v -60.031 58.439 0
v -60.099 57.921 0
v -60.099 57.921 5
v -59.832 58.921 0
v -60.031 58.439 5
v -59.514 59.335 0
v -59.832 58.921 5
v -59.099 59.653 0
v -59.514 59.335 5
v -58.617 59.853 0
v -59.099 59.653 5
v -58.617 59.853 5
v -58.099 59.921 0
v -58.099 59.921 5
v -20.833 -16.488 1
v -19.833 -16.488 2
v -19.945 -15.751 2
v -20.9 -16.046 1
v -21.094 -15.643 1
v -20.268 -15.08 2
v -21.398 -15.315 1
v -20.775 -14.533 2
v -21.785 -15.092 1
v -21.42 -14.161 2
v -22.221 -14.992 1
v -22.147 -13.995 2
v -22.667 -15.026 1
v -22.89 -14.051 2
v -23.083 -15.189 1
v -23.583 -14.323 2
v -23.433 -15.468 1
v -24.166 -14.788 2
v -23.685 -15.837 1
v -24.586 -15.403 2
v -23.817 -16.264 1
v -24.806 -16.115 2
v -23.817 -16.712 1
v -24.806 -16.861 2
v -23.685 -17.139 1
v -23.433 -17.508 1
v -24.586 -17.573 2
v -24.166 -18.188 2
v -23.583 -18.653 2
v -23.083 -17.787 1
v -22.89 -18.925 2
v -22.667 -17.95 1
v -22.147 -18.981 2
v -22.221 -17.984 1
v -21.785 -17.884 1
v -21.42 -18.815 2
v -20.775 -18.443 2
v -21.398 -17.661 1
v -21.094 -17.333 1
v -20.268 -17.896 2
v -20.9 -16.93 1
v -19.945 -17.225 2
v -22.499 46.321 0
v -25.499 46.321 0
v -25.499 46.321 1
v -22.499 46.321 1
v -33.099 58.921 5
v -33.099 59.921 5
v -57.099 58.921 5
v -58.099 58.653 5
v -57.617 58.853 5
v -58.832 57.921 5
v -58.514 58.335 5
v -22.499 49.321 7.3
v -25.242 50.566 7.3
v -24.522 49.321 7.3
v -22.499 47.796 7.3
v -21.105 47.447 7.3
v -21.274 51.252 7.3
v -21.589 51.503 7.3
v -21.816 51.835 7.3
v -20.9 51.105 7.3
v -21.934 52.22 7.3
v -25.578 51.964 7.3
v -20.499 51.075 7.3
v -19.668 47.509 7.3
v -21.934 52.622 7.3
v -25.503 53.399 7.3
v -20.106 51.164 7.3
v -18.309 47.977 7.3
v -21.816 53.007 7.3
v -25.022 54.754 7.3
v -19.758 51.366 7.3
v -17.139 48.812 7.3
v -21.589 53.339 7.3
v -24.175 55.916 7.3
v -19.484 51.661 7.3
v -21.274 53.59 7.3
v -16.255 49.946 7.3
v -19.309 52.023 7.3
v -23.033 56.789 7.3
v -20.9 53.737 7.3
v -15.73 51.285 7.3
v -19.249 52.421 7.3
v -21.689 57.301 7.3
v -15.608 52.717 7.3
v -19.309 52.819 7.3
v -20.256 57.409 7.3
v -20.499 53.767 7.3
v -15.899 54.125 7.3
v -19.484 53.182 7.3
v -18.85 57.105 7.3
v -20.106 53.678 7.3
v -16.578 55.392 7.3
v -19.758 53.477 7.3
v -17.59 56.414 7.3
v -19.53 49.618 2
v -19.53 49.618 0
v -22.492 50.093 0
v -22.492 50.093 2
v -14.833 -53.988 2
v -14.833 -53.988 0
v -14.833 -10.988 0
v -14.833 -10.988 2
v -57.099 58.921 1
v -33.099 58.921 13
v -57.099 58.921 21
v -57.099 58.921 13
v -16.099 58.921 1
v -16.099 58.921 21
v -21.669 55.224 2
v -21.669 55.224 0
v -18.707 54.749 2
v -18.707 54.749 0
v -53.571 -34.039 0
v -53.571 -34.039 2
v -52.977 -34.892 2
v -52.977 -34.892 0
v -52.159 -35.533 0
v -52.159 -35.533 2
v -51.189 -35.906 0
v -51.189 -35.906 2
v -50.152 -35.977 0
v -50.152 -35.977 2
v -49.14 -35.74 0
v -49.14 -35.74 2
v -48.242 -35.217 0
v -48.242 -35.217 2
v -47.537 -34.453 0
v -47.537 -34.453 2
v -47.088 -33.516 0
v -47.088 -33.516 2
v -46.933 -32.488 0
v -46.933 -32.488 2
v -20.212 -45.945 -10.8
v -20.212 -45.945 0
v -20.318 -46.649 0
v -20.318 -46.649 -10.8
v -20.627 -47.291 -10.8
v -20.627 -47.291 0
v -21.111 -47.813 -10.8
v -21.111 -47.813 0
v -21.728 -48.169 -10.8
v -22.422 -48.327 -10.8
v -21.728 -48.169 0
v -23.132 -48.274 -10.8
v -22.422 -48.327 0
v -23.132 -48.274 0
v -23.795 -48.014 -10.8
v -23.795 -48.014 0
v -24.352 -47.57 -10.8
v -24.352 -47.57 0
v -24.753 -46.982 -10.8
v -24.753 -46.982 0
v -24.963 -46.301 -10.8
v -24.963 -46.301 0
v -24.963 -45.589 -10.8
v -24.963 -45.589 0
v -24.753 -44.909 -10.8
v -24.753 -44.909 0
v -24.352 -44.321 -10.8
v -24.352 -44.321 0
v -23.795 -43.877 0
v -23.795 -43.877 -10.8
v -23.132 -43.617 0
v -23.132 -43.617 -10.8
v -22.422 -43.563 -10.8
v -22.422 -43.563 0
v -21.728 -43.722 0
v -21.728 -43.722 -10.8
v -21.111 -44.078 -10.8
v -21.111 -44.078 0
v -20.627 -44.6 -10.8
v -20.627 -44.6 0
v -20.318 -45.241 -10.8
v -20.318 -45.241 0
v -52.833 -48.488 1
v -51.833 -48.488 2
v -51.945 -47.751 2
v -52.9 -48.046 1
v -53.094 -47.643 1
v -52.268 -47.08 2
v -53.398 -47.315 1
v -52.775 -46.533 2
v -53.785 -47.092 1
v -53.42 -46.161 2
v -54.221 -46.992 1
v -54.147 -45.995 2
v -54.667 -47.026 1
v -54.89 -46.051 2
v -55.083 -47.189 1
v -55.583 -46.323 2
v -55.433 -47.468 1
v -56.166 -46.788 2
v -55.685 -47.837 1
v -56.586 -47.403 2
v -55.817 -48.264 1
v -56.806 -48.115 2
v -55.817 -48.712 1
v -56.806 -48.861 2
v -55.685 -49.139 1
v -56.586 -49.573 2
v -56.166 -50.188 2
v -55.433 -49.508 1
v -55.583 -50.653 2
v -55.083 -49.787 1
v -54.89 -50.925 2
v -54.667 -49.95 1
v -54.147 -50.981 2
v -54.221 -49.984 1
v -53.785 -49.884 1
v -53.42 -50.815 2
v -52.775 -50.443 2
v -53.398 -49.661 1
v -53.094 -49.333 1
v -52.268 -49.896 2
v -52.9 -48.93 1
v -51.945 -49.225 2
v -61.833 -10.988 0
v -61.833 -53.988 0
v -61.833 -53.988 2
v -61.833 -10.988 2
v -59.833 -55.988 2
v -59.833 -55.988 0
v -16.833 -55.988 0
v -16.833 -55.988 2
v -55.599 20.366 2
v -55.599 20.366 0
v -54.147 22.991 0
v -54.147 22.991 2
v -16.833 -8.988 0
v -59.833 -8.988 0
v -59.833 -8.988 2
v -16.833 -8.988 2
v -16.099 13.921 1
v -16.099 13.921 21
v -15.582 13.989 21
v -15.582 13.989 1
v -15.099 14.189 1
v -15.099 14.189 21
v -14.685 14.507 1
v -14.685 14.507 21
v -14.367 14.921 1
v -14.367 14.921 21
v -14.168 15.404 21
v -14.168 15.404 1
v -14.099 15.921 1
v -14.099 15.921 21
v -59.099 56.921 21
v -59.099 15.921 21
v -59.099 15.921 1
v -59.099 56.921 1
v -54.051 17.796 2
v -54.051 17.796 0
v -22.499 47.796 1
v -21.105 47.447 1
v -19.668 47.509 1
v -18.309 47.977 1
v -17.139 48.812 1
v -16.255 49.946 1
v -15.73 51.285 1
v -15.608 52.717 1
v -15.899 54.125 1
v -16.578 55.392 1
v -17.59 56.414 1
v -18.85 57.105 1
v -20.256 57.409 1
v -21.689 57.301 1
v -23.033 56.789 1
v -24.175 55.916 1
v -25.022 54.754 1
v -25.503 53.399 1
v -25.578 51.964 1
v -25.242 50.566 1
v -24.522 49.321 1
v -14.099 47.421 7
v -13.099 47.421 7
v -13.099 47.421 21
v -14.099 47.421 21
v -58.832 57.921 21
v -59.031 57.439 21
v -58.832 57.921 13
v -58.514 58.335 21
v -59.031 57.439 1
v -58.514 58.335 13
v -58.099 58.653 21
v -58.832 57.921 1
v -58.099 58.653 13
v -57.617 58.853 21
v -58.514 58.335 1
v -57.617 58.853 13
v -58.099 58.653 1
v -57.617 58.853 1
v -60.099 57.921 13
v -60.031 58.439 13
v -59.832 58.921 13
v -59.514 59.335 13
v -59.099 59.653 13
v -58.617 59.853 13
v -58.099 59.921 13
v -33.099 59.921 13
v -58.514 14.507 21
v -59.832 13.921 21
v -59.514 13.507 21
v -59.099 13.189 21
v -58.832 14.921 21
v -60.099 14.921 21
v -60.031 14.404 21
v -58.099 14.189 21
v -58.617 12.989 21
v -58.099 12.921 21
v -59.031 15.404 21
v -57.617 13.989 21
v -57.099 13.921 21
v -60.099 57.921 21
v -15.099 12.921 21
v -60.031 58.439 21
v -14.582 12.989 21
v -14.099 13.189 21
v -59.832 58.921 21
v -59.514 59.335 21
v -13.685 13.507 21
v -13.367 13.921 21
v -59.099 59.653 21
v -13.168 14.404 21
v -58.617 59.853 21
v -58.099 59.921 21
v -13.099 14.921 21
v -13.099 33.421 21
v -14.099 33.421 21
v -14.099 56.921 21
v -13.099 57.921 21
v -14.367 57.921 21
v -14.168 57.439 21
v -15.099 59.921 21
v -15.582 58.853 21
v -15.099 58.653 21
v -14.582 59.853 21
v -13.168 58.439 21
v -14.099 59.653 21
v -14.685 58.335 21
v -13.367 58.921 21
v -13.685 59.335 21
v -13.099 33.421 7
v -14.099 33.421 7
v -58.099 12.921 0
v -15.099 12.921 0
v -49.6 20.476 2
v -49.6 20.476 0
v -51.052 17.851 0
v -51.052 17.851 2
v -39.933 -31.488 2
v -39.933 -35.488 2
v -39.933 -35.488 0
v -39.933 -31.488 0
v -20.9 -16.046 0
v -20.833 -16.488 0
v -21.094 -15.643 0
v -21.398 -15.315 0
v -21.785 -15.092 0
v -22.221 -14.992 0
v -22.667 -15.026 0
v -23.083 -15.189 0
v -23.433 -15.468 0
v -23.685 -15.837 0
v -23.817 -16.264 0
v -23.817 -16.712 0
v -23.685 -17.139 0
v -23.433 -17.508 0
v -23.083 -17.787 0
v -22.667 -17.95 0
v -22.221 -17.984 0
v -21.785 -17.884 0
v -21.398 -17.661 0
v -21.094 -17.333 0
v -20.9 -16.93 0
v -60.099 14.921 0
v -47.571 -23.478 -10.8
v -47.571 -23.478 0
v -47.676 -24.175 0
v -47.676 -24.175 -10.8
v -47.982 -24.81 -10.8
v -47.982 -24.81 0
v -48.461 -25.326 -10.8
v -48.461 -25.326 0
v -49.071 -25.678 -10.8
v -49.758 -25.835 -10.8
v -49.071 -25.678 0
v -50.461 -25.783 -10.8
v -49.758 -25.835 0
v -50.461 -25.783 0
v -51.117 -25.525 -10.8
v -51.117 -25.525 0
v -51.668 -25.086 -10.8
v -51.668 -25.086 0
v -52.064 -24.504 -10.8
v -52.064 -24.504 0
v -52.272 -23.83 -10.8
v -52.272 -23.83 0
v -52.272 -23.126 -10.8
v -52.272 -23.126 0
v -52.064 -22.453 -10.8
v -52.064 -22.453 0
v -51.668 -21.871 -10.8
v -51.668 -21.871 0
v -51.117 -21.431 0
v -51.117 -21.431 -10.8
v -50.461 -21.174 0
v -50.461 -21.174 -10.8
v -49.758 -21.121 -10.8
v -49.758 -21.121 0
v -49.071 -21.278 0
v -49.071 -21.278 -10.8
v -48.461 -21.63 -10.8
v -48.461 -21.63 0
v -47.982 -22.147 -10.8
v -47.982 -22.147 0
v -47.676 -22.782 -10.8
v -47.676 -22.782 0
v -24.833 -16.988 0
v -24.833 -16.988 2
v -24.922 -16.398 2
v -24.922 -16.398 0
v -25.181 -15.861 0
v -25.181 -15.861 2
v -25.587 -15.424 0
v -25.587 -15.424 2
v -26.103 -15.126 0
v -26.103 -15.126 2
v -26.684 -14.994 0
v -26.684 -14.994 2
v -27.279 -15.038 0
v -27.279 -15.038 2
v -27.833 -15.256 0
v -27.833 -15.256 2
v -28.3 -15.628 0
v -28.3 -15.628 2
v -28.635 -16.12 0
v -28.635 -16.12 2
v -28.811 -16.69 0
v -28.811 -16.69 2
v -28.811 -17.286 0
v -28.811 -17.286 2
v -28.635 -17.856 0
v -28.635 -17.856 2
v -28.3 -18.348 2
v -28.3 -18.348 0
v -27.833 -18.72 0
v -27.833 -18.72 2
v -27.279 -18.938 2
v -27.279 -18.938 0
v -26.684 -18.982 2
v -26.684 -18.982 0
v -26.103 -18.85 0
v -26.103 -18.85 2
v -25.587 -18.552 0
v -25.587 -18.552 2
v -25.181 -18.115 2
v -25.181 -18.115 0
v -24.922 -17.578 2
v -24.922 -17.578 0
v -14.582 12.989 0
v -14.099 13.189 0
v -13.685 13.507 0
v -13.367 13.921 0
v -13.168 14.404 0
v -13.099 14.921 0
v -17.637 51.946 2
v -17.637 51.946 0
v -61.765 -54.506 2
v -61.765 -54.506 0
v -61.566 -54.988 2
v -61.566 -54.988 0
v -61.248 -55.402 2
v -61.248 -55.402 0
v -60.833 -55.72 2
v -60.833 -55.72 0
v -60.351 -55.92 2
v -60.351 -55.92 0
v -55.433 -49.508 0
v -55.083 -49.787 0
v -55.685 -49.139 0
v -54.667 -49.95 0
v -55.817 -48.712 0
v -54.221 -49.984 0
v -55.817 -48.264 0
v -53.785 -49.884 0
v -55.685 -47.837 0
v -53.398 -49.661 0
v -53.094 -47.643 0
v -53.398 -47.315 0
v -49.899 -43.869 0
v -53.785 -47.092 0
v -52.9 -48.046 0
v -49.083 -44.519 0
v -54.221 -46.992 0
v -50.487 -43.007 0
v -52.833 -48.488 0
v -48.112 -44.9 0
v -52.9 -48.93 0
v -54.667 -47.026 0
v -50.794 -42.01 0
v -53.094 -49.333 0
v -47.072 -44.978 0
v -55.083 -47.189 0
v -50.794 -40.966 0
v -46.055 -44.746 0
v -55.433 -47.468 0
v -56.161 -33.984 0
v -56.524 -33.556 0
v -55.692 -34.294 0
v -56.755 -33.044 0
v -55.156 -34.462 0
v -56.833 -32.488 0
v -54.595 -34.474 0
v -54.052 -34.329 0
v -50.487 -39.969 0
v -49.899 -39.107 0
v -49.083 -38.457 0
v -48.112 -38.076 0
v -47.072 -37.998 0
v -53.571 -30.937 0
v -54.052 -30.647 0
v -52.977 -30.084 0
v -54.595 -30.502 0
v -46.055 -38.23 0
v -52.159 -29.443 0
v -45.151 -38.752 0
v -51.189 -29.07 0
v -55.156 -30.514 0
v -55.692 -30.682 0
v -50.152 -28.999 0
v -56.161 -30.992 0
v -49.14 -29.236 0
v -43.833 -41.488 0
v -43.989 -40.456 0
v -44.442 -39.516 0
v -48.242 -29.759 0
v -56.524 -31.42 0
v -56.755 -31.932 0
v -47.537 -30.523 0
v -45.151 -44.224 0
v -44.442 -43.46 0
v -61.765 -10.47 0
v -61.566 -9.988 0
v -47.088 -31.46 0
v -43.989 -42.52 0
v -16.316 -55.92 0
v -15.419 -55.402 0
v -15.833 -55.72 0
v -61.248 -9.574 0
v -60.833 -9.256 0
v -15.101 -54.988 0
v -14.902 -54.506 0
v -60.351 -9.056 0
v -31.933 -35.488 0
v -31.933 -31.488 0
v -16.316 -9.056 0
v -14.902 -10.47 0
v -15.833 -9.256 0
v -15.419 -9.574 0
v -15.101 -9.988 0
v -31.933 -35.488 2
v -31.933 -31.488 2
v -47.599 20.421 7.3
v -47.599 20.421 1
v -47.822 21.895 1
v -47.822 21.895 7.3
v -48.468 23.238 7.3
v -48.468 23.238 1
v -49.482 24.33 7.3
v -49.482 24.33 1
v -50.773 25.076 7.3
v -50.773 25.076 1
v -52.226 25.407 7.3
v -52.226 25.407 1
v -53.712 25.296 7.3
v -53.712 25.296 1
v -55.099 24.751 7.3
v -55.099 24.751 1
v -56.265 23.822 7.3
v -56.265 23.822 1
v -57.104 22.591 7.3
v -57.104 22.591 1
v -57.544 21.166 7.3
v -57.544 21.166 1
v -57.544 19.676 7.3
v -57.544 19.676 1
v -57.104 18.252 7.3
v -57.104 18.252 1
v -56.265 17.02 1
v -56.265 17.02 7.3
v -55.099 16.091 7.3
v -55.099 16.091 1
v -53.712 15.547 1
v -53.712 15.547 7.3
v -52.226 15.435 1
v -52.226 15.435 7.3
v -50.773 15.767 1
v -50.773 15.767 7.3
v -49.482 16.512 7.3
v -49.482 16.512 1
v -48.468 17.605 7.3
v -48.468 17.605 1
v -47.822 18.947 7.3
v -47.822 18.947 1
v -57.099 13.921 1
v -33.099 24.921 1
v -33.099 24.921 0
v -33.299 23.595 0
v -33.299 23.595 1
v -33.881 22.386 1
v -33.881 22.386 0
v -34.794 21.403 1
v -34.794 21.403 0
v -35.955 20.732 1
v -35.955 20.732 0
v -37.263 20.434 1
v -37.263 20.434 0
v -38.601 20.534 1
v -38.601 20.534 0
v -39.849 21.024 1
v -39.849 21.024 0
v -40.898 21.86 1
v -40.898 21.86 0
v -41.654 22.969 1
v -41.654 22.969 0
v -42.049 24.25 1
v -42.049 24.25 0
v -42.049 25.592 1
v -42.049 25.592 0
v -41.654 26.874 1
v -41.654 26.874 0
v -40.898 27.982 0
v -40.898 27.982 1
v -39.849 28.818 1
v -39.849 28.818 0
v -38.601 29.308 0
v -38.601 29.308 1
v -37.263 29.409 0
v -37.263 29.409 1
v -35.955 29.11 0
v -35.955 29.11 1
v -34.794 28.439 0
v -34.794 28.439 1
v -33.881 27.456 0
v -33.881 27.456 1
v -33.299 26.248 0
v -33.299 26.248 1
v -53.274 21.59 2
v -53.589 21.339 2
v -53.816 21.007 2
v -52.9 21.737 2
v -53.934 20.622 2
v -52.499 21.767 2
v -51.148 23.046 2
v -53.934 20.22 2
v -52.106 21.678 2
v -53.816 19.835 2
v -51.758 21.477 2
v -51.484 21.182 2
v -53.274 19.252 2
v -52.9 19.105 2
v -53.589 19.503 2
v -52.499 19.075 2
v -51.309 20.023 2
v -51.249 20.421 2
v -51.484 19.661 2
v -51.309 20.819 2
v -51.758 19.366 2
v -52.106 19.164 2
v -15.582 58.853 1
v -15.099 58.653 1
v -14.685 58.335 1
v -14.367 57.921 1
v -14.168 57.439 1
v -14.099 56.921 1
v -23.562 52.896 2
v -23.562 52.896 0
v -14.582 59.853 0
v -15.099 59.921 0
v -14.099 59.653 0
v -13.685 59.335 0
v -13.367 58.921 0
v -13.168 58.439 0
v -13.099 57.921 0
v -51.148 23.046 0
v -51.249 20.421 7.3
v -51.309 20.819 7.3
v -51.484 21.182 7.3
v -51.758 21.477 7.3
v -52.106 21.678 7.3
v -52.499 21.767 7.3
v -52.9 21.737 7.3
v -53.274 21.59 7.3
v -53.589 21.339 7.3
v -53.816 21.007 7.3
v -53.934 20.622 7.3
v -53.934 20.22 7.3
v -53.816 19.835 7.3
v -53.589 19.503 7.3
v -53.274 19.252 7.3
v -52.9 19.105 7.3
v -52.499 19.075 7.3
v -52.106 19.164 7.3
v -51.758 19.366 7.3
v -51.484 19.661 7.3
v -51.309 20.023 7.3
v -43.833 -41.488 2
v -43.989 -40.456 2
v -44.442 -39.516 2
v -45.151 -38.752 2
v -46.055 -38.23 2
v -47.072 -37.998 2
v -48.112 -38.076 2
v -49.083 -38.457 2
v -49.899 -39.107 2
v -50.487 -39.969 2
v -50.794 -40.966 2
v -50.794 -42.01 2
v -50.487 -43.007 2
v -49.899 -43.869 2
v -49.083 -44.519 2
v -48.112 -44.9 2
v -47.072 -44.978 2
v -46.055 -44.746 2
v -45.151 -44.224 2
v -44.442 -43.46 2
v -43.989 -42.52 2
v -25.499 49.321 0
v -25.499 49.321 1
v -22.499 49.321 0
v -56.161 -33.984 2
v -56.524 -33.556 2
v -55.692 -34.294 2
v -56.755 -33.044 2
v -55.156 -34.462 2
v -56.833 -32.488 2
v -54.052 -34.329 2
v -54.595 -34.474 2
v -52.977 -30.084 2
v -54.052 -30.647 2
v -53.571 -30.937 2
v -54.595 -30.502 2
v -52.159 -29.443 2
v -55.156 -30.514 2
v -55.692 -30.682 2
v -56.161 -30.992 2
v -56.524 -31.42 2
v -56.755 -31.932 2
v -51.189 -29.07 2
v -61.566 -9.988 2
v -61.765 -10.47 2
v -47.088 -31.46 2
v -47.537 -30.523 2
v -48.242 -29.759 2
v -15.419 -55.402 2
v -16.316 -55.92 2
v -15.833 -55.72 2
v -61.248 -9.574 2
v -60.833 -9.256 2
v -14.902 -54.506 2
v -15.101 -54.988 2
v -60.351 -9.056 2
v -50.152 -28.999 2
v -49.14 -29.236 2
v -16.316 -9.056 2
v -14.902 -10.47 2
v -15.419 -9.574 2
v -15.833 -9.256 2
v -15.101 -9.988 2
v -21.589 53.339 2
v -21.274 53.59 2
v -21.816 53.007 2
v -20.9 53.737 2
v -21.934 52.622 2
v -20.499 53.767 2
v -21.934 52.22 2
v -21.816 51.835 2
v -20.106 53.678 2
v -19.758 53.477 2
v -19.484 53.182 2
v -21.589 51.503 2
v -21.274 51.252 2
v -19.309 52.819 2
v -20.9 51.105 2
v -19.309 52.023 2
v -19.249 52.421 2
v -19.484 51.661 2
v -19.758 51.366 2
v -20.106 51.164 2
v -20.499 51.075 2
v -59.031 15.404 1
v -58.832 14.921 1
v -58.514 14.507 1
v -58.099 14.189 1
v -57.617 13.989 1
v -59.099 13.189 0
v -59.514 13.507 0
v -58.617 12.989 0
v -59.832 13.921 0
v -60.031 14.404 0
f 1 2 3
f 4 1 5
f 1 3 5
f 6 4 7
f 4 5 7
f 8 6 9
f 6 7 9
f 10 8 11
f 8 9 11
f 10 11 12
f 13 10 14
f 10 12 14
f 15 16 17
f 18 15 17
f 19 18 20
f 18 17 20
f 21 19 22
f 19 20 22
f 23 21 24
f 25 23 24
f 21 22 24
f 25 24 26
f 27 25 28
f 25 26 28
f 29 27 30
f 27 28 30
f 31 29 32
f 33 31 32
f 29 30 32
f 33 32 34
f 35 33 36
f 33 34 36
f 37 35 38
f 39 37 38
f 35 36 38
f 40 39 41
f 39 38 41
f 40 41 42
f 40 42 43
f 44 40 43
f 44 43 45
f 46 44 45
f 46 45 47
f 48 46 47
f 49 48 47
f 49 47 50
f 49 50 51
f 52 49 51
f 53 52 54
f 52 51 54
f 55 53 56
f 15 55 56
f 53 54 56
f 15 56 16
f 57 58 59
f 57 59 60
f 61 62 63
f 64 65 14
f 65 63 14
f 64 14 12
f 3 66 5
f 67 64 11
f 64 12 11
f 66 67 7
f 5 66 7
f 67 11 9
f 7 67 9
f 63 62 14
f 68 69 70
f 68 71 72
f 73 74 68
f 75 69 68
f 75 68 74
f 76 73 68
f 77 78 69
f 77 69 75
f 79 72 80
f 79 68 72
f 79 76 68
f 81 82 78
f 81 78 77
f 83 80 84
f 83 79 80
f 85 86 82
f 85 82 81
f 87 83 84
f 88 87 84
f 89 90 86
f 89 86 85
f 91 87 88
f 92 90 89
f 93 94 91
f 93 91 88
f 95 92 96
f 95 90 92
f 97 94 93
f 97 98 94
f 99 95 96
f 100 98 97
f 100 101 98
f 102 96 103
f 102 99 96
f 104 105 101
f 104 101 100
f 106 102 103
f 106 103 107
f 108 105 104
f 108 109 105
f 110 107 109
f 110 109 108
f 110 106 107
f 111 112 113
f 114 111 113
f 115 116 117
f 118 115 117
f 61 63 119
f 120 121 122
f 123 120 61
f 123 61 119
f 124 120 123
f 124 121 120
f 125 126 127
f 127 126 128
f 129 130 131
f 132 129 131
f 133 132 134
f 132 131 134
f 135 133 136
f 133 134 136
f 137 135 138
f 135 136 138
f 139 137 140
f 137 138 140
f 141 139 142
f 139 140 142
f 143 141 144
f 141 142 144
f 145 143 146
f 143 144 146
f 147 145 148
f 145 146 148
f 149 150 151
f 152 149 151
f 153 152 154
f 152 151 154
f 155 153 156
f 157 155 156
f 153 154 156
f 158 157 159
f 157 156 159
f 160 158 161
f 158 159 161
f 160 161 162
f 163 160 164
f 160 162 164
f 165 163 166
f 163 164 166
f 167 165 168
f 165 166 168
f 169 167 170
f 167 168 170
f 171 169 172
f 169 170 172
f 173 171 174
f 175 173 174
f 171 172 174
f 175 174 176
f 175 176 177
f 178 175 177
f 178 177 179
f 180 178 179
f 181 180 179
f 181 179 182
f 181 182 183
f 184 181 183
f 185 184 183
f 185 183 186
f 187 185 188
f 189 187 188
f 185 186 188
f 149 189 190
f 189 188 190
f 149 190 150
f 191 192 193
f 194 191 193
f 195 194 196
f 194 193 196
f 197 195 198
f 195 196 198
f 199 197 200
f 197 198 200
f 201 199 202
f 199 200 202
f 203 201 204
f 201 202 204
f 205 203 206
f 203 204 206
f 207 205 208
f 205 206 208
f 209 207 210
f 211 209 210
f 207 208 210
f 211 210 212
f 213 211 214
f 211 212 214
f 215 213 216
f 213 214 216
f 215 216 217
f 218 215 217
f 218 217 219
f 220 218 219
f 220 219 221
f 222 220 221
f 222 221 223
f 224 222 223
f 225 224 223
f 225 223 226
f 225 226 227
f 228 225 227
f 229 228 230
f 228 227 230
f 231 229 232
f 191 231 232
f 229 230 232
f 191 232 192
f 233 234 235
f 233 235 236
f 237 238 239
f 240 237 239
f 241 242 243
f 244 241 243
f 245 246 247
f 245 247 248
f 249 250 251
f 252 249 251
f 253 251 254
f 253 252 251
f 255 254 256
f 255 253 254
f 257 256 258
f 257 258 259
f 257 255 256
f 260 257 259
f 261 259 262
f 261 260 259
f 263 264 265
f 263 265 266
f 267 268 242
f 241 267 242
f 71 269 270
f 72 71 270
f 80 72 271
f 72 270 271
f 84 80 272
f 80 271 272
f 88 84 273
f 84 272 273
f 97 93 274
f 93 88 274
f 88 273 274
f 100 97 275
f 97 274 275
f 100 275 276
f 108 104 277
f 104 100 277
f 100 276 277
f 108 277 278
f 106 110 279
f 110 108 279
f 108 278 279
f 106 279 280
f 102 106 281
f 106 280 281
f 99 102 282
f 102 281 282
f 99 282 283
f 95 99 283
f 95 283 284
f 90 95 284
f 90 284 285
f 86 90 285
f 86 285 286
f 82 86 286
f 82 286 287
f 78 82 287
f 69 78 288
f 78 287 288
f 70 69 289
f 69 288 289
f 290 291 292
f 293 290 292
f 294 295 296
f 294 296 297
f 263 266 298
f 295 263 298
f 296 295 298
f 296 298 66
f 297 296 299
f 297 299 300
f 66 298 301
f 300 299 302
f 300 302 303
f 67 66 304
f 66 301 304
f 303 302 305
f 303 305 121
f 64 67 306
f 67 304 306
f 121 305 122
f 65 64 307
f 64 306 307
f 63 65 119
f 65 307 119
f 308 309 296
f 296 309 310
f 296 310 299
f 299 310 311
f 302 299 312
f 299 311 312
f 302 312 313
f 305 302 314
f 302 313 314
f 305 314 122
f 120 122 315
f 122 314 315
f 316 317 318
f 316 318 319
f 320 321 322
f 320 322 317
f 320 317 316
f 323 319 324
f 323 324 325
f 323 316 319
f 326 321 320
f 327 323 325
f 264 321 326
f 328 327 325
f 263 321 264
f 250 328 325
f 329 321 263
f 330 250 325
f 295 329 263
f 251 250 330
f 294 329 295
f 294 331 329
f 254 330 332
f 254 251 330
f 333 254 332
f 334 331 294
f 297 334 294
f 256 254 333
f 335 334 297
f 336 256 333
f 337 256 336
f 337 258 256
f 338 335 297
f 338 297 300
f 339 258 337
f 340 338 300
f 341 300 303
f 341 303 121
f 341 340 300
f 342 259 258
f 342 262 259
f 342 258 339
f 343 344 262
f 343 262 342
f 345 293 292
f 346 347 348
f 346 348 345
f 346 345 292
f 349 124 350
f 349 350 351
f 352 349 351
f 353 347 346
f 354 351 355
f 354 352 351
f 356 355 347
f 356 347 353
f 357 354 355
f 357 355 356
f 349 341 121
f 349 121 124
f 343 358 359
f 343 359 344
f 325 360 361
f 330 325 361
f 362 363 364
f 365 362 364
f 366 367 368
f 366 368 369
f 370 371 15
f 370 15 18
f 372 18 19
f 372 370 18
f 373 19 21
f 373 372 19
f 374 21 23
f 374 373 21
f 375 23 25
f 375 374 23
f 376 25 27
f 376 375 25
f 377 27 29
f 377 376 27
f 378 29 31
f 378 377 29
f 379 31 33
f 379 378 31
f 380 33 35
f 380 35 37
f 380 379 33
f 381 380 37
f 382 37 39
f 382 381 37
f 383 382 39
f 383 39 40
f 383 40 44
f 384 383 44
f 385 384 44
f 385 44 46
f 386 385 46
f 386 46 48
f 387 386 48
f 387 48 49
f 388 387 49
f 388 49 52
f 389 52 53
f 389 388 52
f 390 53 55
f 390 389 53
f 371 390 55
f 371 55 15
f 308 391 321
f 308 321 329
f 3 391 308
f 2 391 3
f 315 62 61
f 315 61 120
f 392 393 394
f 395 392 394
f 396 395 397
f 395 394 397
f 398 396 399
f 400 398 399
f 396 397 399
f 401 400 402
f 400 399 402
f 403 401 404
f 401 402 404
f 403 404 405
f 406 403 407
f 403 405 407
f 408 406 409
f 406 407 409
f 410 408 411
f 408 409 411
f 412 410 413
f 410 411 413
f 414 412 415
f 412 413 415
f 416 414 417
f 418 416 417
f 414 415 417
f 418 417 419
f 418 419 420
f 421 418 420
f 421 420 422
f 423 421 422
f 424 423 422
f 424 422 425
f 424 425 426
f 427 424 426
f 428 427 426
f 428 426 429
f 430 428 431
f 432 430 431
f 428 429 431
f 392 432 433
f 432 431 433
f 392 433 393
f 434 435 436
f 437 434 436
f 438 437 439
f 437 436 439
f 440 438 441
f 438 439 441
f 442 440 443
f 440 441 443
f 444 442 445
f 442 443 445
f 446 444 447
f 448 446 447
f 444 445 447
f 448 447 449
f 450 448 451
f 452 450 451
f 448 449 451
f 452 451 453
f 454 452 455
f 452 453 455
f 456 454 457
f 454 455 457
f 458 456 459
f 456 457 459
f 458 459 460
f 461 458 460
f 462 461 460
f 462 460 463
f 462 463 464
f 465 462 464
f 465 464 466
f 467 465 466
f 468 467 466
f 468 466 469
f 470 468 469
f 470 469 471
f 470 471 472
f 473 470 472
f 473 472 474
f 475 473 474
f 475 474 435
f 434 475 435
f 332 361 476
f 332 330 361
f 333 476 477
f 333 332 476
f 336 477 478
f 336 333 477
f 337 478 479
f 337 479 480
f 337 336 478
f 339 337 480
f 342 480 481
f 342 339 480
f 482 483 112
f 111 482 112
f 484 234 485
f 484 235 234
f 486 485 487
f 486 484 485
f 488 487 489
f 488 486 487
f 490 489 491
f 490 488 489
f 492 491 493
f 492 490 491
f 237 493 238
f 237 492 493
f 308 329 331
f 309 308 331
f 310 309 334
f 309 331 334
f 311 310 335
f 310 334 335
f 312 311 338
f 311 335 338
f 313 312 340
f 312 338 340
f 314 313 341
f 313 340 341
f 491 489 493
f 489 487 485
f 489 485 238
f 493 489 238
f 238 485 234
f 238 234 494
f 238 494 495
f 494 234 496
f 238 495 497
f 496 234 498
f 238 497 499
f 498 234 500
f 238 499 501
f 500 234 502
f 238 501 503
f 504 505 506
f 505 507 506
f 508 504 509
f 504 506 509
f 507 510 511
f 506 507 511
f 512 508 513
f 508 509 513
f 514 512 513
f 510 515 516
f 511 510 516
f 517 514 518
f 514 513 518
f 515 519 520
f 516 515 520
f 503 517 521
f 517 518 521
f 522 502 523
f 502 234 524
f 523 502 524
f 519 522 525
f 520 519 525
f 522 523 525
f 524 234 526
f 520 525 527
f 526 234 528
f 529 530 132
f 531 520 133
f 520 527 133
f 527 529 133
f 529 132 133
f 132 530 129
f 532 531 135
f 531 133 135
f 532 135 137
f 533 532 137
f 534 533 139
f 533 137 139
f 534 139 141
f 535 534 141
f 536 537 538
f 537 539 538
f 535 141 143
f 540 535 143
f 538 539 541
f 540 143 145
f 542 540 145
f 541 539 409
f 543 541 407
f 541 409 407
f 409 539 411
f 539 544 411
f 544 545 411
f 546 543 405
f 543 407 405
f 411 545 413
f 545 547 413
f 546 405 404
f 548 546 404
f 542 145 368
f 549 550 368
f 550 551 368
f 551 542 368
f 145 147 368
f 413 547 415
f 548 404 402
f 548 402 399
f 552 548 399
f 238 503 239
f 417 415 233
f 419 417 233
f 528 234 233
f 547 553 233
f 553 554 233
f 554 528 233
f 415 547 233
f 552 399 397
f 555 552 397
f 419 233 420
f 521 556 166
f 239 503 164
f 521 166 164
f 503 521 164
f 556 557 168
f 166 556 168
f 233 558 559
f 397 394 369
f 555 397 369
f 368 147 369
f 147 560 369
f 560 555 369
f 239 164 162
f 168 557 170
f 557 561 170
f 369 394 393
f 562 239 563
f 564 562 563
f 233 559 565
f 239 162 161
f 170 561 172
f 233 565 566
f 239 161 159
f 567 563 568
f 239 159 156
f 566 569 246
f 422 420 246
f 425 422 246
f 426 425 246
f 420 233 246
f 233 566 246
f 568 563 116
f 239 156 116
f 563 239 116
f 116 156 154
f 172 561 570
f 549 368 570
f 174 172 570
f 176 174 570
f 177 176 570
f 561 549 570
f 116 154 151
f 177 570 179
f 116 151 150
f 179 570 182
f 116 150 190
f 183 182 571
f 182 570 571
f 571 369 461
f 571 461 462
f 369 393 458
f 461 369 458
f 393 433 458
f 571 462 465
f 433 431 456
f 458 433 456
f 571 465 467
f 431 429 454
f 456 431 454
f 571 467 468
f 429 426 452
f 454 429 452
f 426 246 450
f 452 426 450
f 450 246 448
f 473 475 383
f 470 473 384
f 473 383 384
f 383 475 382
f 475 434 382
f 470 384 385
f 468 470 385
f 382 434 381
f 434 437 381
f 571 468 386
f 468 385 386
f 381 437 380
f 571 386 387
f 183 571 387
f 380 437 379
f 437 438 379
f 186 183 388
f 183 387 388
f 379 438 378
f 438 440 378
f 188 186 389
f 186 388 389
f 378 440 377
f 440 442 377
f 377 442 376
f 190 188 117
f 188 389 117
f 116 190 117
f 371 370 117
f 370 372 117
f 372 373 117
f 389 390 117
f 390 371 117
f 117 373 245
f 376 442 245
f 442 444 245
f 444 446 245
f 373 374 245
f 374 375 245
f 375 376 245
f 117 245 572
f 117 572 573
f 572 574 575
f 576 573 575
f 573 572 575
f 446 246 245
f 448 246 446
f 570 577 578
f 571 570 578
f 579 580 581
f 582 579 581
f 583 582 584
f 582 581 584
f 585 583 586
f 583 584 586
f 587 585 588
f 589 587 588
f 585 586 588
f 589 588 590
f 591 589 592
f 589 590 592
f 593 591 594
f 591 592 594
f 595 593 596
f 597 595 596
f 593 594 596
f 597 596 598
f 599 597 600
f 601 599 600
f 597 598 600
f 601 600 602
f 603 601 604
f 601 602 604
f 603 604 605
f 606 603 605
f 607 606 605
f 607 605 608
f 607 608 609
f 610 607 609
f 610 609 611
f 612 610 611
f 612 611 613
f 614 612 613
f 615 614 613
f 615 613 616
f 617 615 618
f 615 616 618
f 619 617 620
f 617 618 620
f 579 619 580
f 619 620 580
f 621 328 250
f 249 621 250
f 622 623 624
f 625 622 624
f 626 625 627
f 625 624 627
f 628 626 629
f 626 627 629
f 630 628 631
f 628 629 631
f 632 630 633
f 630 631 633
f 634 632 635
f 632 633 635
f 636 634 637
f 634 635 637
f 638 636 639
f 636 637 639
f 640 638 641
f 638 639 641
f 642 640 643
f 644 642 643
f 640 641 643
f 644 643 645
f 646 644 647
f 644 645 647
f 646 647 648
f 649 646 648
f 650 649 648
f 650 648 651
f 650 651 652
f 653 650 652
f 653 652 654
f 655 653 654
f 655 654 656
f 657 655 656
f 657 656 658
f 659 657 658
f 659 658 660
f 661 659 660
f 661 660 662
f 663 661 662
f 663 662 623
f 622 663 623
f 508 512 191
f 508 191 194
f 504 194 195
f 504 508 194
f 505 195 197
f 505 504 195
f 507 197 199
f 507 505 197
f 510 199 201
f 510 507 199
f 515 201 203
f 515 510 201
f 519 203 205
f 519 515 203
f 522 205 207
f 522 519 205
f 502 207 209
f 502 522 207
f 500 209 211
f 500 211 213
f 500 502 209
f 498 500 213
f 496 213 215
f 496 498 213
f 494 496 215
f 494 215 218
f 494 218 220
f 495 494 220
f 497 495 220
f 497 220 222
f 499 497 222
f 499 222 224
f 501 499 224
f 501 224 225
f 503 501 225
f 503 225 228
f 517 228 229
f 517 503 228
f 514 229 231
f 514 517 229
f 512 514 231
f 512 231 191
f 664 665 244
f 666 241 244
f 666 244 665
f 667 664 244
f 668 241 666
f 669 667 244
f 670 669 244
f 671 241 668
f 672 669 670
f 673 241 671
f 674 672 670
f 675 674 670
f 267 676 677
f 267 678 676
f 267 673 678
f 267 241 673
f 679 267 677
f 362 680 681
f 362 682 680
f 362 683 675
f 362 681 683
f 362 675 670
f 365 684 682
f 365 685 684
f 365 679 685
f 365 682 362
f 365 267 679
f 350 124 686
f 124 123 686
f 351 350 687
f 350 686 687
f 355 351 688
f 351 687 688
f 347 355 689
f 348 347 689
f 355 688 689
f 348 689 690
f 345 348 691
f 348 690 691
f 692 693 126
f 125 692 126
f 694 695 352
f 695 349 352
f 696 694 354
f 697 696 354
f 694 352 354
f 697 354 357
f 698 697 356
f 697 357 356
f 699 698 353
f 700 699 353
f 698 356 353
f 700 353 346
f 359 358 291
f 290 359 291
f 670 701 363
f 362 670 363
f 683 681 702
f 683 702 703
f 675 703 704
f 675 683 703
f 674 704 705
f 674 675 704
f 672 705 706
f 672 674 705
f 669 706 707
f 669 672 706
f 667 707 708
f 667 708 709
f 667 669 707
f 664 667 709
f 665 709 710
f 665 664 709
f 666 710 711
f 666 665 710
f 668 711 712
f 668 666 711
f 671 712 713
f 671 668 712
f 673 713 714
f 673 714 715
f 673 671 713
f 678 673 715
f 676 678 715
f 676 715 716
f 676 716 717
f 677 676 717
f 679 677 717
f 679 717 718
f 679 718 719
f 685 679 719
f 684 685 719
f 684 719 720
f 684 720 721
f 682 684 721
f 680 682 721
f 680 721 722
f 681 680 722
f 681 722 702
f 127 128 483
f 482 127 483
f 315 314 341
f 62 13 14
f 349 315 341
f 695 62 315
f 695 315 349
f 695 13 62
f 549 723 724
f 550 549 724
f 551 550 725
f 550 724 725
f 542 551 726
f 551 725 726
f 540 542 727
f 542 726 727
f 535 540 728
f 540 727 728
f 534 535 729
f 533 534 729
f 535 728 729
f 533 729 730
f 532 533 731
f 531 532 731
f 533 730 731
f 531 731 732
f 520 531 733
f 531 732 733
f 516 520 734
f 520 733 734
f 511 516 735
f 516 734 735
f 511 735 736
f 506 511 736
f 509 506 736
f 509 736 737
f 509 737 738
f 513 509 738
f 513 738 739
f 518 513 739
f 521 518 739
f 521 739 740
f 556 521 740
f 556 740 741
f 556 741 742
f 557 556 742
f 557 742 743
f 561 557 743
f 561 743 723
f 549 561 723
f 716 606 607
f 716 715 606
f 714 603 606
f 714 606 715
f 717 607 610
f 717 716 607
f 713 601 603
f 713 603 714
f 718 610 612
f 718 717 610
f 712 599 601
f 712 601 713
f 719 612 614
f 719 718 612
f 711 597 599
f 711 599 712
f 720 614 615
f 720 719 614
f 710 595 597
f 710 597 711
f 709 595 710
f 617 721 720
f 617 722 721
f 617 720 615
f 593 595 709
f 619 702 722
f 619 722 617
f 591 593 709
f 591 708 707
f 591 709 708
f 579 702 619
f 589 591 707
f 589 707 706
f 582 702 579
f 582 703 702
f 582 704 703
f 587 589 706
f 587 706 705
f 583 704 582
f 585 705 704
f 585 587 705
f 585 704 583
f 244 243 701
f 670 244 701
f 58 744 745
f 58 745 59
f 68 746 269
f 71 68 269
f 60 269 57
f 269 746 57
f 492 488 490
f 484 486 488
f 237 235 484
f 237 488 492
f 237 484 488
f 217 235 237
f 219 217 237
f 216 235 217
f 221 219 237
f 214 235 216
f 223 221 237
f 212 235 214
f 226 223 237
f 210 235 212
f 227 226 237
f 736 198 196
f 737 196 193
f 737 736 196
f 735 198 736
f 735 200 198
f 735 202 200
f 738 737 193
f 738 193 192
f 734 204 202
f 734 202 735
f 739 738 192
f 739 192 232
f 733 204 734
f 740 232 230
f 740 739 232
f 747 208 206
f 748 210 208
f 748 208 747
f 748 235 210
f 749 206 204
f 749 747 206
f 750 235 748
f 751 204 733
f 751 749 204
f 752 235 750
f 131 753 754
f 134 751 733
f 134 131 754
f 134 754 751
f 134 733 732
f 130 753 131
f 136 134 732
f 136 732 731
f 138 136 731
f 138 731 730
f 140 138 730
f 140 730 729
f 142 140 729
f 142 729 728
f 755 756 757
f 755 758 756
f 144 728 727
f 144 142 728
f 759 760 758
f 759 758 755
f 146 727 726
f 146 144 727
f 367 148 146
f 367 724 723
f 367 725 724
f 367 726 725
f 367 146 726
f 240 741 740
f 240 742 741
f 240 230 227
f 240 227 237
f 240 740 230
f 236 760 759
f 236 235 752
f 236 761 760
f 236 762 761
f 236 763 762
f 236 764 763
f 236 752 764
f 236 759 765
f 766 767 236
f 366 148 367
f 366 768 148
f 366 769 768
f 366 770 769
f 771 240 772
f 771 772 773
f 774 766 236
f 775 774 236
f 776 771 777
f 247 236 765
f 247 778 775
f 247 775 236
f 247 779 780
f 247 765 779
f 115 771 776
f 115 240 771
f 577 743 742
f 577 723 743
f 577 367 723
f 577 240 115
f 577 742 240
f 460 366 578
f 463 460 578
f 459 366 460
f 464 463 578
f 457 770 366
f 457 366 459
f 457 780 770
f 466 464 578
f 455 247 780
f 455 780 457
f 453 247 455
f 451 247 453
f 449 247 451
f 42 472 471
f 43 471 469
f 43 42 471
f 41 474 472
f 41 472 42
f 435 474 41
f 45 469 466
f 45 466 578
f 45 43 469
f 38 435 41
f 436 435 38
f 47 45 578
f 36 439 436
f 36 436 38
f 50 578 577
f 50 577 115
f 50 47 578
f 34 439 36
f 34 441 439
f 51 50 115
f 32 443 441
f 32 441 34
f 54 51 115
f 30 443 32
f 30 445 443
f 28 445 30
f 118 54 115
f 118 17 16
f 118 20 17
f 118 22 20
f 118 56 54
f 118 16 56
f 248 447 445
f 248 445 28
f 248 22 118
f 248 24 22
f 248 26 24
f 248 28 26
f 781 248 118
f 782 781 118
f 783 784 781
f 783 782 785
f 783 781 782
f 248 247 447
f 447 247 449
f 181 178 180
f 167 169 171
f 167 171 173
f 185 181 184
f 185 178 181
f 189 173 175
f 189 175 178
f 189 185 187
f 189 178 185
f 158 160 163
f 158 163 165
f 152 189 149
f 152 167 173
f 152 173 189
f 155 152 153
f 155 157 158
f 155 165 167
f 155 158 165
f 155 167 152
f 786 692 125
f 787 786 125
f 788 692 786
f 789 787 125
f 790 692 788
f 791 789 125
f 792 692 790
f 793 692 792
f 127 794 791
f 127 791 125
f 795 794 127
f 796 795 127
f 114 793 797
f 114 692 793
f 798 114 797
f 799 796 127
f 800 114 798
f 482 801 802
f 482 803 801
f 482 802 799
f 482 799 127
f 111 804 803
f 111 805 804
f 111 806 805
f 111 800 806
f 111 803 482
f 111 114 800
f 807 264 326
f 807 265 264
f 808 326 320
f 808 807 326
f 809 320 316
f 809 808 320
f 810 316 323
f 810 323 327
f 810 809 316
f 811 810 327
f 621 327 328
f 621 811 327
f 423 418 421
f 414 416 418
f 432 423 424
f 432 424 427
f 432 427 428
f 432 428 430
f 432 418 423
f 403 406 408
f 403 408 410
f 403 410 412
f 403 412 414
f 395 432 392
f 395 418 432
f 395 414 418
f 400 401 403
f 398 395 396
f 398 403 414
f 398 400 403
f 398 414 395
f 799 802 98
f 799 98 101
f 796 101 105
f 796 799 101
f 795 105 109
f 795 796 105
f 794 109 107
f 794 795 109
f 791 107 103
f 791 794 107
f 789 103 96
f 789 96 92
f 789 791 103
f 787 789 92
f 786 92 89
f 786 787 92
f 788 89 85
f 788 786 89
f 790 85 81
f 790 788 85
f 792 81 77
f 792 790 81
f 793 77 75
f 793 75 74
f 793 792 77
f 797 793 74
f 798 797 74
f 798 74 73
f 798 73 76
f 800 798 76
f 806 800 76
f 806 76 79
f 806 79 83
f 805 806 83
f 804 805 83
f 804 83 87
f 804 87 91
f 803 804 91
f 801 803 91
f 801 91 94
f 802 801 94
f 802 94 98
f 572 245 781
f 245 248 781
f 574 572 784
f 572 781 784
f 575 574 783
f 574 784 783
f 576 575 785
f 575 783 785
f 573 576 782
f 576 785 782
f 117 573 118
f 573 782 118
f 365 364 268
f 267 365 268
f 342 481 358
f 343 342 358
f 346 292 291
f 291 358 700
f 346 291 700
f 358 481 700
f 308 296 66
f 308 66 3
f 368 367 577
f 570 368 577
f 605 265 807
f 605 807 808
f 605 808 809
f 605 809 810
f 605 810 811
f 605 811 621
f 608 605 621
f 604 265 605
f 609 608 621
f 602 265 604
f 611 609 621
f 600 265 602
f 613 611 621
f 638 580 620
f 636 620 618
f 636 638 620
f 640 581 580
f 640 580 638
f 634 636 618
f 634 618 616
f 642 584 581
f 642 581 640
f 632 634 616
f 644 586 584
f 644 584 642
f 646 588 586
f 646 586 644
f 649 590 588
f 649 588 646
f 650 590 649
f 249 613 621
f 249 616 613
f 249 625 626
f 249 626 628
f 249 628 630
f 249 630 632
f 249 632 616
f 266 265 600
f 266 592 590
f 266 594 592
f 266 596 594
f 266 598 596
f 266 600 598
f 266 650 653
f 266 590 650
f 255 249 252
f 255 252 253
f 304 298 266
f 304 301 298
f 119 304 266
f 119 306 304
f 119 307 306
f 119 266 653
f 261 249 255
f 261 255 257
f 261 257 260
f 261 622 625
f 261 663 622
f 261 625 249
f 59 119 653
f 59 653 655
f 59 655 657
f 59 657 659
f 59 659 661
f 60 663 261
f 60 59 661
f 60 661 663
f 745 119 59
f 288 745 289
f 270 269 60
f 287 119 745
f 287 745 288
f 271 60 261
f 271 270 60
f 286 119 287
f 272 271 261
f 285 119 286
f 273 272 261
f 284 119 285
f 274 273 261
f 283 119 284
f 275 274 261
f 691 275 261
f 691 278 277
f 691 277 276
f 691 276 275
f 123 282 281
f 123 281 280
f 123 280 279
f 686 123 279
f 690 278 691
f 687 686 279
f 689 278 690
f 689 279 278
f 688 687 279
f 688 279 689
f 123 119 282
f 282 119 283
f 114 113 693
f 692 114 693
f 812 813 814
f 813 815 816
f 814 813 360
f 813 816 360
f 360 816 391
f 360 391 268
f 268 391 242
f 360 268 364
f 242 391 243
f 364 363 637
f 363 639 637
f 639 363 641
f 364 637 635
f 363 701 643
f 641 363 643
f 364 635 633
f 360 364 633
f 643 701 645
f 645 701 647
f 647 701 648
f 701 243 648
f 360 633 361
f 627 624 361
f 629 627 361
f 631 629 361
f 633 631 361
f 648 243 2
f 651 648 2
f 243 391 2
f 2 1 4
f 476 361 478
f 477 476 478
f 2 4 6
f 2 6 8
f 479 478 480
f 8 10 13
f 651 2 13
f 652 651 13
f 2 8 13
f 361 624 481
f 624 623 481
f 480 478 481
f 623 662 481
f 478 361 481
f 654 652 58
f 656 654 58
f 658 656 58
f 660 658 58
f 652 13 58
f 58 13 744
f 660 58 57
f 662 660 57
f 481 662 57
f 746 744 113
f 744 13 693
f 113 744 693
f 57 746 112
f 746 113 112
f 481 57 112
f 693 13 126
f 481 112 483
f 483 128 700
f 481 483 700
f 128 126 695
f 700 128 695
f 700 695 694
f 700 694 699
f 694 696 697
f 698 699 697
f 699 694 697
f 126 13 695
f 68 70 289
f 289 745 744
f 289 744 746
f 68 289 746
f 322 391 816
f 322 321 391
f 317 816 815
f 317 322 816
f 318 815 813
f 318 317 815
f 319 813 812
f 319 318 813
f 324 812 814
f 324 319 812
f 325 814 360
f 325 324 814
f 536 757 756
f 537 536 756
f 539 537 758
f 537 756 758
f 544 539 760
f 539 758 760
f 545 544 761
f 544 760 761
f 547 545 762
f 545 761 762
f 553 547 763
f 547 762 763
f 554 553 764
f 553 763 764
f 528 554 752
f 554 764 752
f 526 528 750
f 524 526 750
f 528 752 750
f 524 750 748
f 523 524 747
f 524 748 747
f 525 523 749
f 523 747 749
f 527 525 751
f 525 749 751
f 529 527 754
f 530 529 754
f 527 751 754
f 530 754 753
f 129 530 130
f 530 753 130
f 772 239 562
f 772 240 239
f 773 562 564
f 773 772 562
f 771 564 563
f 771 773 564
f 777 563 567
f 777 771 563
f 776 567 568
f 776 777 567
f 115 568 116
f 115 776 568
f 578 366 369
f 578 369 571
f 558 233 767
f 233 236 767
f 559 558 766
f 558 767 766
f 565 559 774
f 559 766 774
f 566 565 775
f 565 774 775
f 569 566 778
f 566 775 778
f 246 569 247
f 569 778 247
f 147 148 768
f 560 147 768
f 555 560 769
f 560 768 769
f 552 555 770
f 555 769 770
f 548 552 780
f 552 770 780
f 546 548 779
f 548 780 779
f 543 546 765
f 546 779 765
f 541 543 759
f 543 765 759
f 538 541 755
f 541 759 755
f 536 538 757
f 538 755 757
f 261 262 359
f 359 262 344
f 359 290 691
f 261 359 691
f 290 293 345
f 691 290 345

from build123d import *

# Parameters (mm, degrees)
F0_W      = 47
F0_H      = 47
F1_DEPTH  = 21
F2_W      = 45
F2_H      = 45
F3_DEPTH  = 20
F5_R      = 2.5
F5_R_2    = 1.35
F6_DEPTH  = 6.3
F7_DEPTH  = 2
F8_R      = 5
F8_R_2    = 2.5
F9_DEPTH  = 6.3
F10_R     = 1.35
F11_DEPTH = 2
F12_W     = 47
F12_H     = 47
F12_R     = 1.5
F12_R_2   = 2.5
F13_DEPTH = 2
F14_SIZE  = 1
F15_R     = 2
F16_R     = 2
F17_W     = 25
F17_H     = 8
F17_W_2   = 2
F18_DEPTH = 2
F19_W     = 14
F19_H     = 14
F20_DEPTH = 3
F21_R     = 3.5
F21_R_2   = 2
F21_W     = 8
F21_H     = 4
F22_DEPTH = 5
F23_R     = 4.5
F23_W     = 3
F23_H     = 3
F24_DEPTH = 10
F25_R     = 2.3636646969
F25_R_2   = 2.3886353596
F26_DEPTH = 10.8


with BuildPart() as f1:
    # F0 (on Top) → F1 (new body)
    with BuildSketch(Plane.XY):
        with Locations((-36.5994639099, 36.4211554304)):
            Rectangle(F0_W, F0_H)
    extrude(amount=F1_DEPTH)

    # F2 (on face) → F3 (cut)
    with BuildSketch(Plane.XY.offset(21)):
        with Locations((-36.5994639099, 36.4211554304)):
            Rectangle(F2_W, F2_H)
    extrude(amount=-F3_DEPTH, mode=Mode.SUBTRACT)

    # F5 (on face) → F6 (join)
    with BuildSketch(Plane.XY.offset(1)):
        with Locations((-52.5994639099, 20.4211554304)):
            Circle(F5_R)
        with Locations((-52.5994639099, 20.4211554304)):
            Circle(F5_R_2, mode=Mode.SUBTRACT)
        with Locations((-20.5994639099, 52.4211554304)):
            Circle(F5_R)
        with Locations((-20.5994639099, 52.4211554304)):
            Circle(F5_R_2, mode=Mode.SUBTRACT)
    extrude(amount=F6_DEPTH)

    # F7 (cut): faces of the model
    f7_faces = [f1.faces().sort_by_distance(p)[0] for p in [
        (-52.5994639099, 20.4211554304, 1),
        (-20.5994639099, 52.4211554304, 1),
    ]]
    extrude(f7_faces, amount=-F7_DEPTH, mode=Mode.SUBTRACT)

    # F8 (on face) → F9 (join)
    with BuildSketch(Plane.XY.offset(1)):
        with Locations((-52.5994639099, 20.4211554304)):
            Circle(F8_R)
        with Locations((-52.5994639099, 20.4211554304)):
            Circle(F8_R_2, mode=Mode.SUBTRACT)
        with Locations((-20.5994639099, 52.4211554304)):
            Circle(F8_R)
        with Locations((-20.5994639099, 52.4211554304)):
            Circle(F8_R_2, mode=Mode.SUBTRACT)
    extrude(amount=F9_DEPTH)

    # F10 (on face) → F11 (cut)
    with BuildSketch(Plane(origin=(0, 0, 0), x_dir=(1, 0, 0), z_dir=(0, 0, -1))):
        Polygon((-49.5999728624, -20.4764135179), (-51.0518634785, -17.8511490286), (-54.051354526, -17.7958909411), (-55.5989549573, -20.3658973428), (-54.1470643412, -22.9911618321), (-51.1475732937, -23.0464199197), align=None)
        with Locations((-52.5994639099, -20.4211554304)):
            Circle(F10_R, mode=Mode.SUBTRACT)
        Polygon((-18.7069320828, -54.7488846422), (-17.6373253658, -51.9460393966), (-19.5298571928, -49.6183101848), (-22.4919957369, -50.0934262185), (-23.561602454, -52.8962714641), (-21.669070627, -55.224000676), align=None)
        with Locations((-20.5994639099, -52.4211554304)):
            Circle(F10_R, mode=Mode.SUBTRACT)
    extrude(amount=-F11_DEPTH, mode=Mode.SUBTRACT)

    # F16
    f16_edges = [f1.edges().sort_by_distance(p)[0] for p in [
        (-60.099464, 12.921155, 10.5),
        (-13.099464, 59.921155, 10.5),
        (-13.099464, 12.921155, 10.5),
        (-59.099464, 13.921155, 11),
        (-14.099464, 13.921155, 11),
        (-59.099464, 58.921155, 11),
        (-14.099464, 58.921155, 11),
        (-60.099464, 59.921155, 10.5),
    ]]
    fillet(f16_edges, radius=F16_R)

    # F17 (on face) → F18 (cut)
    with BuildSketch(Plane(origin=(0, 59.9211554304, 0), x_dir=(-1, 0, 0), z_dir=(0, 1, 0))):
        with Locations((45.5994639099, 9)):
            Rectangle(F17_W, F17_H)
        with Locations((59.0994639099, 9)):
            Rectangle(F17_W_2, F17_H)
    extrude(amount=-F18_DEPTH, mode=Mode.SUBTRACT)

    # F19 (on face) → F20 (cut)
    with BuildSketch(Plane.YZ.offset(-13.0994639099)):
        with Locations((40.4211554304, 14)):
            Rectangle(F19_W, F19_H)
    extrude(amount=-F20_DEPTH, mode=Mode.SUBTRACT)

    # F23 (on face) → F24 (cut)
    with BuildSketch(Plane(origin=(0, 0, 0), x_dir=(1, 0, 0), z_dir=(0, 0, -1))):
        with Locations((-37.5994639099, -24.9211554304)):
            Circle(F23_R)
        with Locations((-23.9994639099, -47.8211554304)):
            Rectangle(F23_W, F23_H)
    extrude(amount=-F24_DEPTH, mode=Mode.SUBTRACT)


with BuildPart() as f13:
    # F12 (on Top) → F13 (new body)
    with BuildSketch(Plane.XY):
        with Locations((-38.3334934391, -32.4880076721)):
            Rectangle(F12_W, F12_H)
        with Locations((-58.3334934391, -52.4880076721)):
            Circle(F12_R, mode=Mode.SUBTRACT)
        with Locations((-54.3334934391, -48.4880076721)):
            Circle(F12_R_2, mode=Mode.SUBTRACT)
        with Locations((-18.3334934391, -52.4880076721)):
            Circle(F12_R, mode=Mode.SUBTRACT)
        with Locations((-58.3334934391, -12.4880076721)):
            Circle(F12_R, mode=Mode.SUBTRACT)
        with Locations((-22.3334934391, -16.4880076721)):
            Circle(F12_R_2, mode=Mode.SUBTRACT)
        with Locations((-18.3334934391, -12.4880076721)):
            Circle(F12_R, mode=Mode.SUBTRACT)
        with Locations((-58.3334934391, -12.4880076721)):
            Circle(F12_R)
        with Locations((-18.3334934391, -12.4880076721)):
            Circle(F12_R)
        with Locations((-18.3334934391, -52.4880076721)):
            Circle(F12_R)
        with Locations((-58.3334934391, -52.4880076721)):
            Circle(F12_R)
        with Locations((-22.3334934391, -16.4880076721)):
            Circle(F12_R_2)
        with Locations((-22.3334934391, -16.4880076721)):
            Circle(F12_R, mode=Mode.SUBTRACT)
        with Locations((-54.3334934391, -48.4880076721)):
            Circle(F12_R_2)
        with Locations((-54.3334934391, -48.4880076721)):
            Circle(F12_R, mode=Mode.SUBTRACT)
    extrude(amount=F13_DEPTH)

    # F14
    f14_edges = [f13.edges().sort_by_distance(p)[0] for p in [
        (-23.833493, -16.488008, 2),
        (-55.833493, -48.488008, 2),
    ]]
    chamfer(f14_edges, length=F14_SIZE)

    # F15
    f15_edges = [f13.edges().sort_by_distance(p)[0] for p in [
        (-61.833493, -55.988008, 1),
        (-61.833493, -8.988008, 1),
        (-14.833493, -8.988008, 1),
        (-14.833493, -55.988008, 1),
    ]]
    fillet(f15_edges, radius=F15_R)

    # F21 (on face) → F22 (cut)
    with BuildSketch(Plane.XY.offset(2)):
        with Locations((-47.3334934391, -41.4880076721)):
            Circle(F21_R)
        with Locations((-26.8334934391, -16.9880076721)):
            Circle(F21_R_2)
        with Locations((-35.9334934391, -33.4880076721)):
            Rectangle(F21_W, F21_H)
        with BuildLine():
            ThreePointArc((-53.5709934391, -34.0391665131), (-49.637016823, -35.8961780024), (-46.9334934391, -32.4880076721))
            ThreePointArc((-46.9334934391, -32.4880076721), (-49.637016823, -29.0798373419), (-53.5709934391, -30.9368488311))
            ThreePointArc((-53.5709934391, -30.9368488311), (-53.0272542523, -31.6292294703), (-52.8334934391, -32.4880076721))
            ThreePointArc((-52.8334934391, -32.4880076721), (-53.0272542523, -33.346785874), (-53.5709934391, -34.0391665131))
        make_face()
        with BuildLine():
            ThreePointArc((-52.8334934391, -32.4880076721), (-53.0272542523, -31.6292294703), (-53.5709934391, -30.9368488311))
            ThreePointArc((-53.5709934391, -30.9368488311), (-53.9334934391, -32.4880076721), (-53.5709934391, -34.0391665131))
            ThreePointArc((-53.5709934391, -34.0391665131), (-53.0272542523, -33.346785874), (-52.8334934391, -32.4880076721))
        make_face()
        with BuildLine():
            ThreePointArc((-53.5709934391, -34.0391665131), (-53.9334934391, -32.4880076721), (-53.5709934391, -30.9368488311))
            ThreePointArc((-53.5709934391, -30.9368488311), (-56.8334934391, -32.4880076721), (-53.5709934391, -34.0391665131))
        make_face()
    extrude(amount=-F22_DEPTH, mode=Mode.SUBTRACT)

    # F25 (on face) → F26 (join)
    with BuildSketch(Plane(origin=(0, 0, 0), x_dir=(1, 0, 0), z_dir=(0, 0, -1))):
        with Locations((-49.9348416924, 23.4782043844)):
            Circle(F25_R)
        with Locations((-22.6007383317, 45.9453836083)):
            Circle(F25_R_2)
    extrude(amount=F26_DEPTH)


solid = Compound([f1.part, f13.part])
